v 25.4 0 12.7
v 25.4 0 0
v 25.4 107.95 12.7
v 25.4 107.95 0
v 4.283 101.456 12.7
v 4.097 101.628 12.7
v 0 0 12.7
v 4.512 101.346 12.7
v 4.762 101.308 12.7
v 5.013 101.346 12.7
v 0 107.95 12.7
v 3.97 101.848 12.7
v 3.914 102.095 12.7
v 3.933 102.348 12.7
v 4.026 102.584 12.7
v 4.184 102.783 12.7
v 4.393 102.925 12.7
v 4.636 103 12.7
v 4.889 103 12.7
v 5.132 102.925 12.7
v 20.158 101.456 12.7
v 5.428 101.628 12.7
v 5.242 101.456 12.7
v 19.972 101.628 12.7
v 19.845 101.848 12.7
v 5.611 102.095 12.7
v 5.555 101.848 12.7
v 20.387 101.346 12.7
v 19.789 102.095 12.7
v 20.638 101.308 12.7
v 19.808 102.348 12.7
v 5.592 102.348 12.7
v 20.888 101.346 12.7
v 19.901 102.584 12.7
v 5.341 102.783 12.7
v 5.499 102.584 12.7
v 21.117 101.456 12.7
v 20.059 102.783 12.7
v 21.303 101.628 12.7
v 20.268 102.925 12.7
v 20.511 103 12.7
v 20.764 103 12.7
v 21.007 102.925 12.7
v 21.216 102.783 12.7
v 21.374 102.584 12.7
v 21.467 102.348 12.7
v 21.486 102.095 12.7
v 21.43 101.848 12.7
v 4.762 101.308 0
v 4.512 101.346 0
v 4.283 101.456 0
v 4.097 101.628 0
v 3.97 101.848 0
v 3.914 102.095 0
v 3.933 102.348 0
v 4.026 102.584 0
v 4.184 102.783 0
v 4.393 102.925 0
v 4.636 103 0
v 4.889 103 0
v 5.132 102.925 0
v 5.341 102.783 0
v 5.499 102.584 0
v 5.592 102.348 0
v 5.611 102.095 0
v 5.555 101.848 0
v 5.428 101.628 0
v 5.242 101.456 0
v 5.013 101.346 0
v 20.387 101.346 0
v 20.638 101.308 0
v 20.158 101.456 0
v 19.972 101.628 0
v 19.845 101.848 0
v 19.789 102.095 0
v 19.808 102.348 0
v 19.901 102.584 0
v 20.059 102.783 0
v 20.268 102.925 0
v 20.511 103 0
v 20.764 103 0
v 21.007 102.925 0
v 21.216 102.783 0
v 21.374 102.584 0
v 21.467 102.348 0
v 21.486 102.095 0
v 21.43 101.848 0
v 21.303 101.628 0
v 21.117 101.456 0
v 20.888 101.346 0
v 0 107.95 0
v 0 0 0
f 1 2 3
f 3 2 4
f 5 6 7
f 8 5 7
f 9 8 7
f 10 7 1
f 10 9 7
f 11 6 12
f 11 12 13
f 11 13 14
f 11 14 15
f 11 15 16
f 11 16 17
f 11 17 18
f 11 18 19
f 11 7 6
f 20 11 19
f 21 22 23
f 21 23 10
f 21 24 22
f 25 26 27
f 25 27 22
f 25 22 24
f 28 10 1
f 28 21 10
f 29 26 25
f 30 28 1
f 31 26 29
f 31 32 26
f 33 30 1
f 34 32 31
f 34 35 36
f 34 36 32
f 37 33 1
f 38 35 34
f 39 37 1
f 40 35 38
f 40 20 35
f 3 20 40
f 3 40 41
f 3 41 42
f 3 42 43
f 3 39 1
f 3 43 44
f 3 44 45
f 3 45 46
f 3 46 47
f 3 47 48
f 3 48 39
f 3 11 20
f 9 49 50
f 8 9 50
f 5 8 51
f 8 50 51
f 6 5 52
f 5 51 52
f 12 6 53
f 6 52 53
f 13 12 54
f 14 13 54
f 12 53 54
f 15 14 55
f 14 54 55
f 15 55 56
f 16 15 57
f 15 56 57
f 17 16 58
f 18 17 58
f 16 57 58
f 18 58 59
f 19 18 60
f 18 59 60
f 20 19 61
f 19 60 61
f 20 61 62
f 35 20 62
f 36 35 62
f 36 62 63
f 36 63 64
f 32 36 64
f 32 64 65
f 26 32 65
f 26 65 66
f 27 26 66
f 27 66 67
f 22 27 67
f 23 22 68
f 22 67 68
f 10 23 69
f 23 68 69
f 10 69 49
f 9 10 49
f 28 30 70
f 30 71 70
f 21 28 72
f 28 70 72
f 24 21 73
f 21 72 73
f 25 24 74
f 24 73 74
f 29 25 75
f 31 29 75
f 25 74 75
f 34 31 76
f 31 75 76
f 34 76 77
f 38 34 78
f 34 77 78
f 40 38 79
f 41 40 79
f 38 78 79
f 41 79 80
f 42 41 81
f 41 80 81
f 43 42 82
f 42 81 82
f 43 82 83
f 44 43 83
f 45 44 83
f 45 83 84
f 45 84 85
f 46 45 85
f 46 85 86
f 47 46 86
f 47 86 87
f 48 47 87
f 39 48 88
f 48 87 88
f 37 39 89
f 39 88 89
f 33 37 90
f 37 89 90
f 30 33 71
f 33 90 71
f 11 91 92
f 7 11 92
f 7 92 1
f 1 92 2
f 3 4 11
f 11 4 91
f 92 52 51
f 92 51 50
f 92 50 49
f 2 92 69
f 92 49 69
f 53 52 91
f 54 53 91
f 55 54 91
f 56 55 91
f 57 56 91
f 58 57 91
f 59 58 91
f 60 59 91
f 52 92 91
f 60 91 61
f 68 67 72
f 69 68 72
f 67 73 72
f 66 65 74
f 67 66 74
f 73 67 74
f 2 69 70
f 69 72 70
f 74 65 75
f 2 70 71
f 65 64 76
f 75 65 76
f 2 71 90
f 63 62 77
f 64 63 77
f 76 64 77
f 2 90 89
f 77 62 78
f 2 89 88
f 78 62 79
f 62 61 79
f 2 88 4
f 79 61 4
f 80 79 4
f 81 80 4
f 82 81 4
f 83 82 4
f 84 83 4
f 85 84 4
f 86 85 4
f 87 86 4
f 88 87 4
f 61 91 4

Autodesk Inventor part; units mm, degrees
ref_plane "YZ Plane" through (0, 0, 0) normal (1, 0, 0) x (0, 1, 0)
ref_plane "XZ Plane" through (0, 0, 0) normal (0, 1, 0) x (-1, 0, 0)
ref_plane "XY Plane" through (0, 0, 0) normal (0, 0, 1) x (1, 0, 0)
sketch "Sketch1" plane through (0, 0, 0) normal (0, 0, 1) x (1, 0, 0)
  line L0 (0, 0) -> (25.4, 0)
  line L1 (25.4, 0) -> (25.4, 107.95)
  line L2 (25.4, 107.95) -> (0, 107.95)
  line L3 (0, 107.95) -> (0, 0)
  dimension "d0" = 25.4
  dimension "d1" = 107.95
extrude "Extrusion1" add sketch "Sketch1" along normal blind 12.7
sketch "Sketch2" plane through (0, 0, 12.7) normal (0, 0, 1) x (1, 0, 0)
  line L0 (25.4, 107.95) -> (0, 107.95) projected
  line L1 (0, 107.95) -> (0, 0) projected
  point P0 (4.7625, 102.1588)
  point P1 (20.6375, 102.1588)
  dimension "d4" = 15.875
  dimension "d5" = 5.7912
  dimension "d6" = 5.7912
  dimension "d7" = 25.4
  dimension "d8" = 4.7625
hole "Hole1" at (20.6375, 102.1588, 12.7) at (4.7625, 102.1588, 12.7) direction (0, 0, -1) diameter 1.7018 end through all
equation "\"d6\" = d5"
equation "\"d8\" = -0.5 * d4 + 0.5 * d7"
properties part number "HingeBrace" material "Aluminum 6061"
